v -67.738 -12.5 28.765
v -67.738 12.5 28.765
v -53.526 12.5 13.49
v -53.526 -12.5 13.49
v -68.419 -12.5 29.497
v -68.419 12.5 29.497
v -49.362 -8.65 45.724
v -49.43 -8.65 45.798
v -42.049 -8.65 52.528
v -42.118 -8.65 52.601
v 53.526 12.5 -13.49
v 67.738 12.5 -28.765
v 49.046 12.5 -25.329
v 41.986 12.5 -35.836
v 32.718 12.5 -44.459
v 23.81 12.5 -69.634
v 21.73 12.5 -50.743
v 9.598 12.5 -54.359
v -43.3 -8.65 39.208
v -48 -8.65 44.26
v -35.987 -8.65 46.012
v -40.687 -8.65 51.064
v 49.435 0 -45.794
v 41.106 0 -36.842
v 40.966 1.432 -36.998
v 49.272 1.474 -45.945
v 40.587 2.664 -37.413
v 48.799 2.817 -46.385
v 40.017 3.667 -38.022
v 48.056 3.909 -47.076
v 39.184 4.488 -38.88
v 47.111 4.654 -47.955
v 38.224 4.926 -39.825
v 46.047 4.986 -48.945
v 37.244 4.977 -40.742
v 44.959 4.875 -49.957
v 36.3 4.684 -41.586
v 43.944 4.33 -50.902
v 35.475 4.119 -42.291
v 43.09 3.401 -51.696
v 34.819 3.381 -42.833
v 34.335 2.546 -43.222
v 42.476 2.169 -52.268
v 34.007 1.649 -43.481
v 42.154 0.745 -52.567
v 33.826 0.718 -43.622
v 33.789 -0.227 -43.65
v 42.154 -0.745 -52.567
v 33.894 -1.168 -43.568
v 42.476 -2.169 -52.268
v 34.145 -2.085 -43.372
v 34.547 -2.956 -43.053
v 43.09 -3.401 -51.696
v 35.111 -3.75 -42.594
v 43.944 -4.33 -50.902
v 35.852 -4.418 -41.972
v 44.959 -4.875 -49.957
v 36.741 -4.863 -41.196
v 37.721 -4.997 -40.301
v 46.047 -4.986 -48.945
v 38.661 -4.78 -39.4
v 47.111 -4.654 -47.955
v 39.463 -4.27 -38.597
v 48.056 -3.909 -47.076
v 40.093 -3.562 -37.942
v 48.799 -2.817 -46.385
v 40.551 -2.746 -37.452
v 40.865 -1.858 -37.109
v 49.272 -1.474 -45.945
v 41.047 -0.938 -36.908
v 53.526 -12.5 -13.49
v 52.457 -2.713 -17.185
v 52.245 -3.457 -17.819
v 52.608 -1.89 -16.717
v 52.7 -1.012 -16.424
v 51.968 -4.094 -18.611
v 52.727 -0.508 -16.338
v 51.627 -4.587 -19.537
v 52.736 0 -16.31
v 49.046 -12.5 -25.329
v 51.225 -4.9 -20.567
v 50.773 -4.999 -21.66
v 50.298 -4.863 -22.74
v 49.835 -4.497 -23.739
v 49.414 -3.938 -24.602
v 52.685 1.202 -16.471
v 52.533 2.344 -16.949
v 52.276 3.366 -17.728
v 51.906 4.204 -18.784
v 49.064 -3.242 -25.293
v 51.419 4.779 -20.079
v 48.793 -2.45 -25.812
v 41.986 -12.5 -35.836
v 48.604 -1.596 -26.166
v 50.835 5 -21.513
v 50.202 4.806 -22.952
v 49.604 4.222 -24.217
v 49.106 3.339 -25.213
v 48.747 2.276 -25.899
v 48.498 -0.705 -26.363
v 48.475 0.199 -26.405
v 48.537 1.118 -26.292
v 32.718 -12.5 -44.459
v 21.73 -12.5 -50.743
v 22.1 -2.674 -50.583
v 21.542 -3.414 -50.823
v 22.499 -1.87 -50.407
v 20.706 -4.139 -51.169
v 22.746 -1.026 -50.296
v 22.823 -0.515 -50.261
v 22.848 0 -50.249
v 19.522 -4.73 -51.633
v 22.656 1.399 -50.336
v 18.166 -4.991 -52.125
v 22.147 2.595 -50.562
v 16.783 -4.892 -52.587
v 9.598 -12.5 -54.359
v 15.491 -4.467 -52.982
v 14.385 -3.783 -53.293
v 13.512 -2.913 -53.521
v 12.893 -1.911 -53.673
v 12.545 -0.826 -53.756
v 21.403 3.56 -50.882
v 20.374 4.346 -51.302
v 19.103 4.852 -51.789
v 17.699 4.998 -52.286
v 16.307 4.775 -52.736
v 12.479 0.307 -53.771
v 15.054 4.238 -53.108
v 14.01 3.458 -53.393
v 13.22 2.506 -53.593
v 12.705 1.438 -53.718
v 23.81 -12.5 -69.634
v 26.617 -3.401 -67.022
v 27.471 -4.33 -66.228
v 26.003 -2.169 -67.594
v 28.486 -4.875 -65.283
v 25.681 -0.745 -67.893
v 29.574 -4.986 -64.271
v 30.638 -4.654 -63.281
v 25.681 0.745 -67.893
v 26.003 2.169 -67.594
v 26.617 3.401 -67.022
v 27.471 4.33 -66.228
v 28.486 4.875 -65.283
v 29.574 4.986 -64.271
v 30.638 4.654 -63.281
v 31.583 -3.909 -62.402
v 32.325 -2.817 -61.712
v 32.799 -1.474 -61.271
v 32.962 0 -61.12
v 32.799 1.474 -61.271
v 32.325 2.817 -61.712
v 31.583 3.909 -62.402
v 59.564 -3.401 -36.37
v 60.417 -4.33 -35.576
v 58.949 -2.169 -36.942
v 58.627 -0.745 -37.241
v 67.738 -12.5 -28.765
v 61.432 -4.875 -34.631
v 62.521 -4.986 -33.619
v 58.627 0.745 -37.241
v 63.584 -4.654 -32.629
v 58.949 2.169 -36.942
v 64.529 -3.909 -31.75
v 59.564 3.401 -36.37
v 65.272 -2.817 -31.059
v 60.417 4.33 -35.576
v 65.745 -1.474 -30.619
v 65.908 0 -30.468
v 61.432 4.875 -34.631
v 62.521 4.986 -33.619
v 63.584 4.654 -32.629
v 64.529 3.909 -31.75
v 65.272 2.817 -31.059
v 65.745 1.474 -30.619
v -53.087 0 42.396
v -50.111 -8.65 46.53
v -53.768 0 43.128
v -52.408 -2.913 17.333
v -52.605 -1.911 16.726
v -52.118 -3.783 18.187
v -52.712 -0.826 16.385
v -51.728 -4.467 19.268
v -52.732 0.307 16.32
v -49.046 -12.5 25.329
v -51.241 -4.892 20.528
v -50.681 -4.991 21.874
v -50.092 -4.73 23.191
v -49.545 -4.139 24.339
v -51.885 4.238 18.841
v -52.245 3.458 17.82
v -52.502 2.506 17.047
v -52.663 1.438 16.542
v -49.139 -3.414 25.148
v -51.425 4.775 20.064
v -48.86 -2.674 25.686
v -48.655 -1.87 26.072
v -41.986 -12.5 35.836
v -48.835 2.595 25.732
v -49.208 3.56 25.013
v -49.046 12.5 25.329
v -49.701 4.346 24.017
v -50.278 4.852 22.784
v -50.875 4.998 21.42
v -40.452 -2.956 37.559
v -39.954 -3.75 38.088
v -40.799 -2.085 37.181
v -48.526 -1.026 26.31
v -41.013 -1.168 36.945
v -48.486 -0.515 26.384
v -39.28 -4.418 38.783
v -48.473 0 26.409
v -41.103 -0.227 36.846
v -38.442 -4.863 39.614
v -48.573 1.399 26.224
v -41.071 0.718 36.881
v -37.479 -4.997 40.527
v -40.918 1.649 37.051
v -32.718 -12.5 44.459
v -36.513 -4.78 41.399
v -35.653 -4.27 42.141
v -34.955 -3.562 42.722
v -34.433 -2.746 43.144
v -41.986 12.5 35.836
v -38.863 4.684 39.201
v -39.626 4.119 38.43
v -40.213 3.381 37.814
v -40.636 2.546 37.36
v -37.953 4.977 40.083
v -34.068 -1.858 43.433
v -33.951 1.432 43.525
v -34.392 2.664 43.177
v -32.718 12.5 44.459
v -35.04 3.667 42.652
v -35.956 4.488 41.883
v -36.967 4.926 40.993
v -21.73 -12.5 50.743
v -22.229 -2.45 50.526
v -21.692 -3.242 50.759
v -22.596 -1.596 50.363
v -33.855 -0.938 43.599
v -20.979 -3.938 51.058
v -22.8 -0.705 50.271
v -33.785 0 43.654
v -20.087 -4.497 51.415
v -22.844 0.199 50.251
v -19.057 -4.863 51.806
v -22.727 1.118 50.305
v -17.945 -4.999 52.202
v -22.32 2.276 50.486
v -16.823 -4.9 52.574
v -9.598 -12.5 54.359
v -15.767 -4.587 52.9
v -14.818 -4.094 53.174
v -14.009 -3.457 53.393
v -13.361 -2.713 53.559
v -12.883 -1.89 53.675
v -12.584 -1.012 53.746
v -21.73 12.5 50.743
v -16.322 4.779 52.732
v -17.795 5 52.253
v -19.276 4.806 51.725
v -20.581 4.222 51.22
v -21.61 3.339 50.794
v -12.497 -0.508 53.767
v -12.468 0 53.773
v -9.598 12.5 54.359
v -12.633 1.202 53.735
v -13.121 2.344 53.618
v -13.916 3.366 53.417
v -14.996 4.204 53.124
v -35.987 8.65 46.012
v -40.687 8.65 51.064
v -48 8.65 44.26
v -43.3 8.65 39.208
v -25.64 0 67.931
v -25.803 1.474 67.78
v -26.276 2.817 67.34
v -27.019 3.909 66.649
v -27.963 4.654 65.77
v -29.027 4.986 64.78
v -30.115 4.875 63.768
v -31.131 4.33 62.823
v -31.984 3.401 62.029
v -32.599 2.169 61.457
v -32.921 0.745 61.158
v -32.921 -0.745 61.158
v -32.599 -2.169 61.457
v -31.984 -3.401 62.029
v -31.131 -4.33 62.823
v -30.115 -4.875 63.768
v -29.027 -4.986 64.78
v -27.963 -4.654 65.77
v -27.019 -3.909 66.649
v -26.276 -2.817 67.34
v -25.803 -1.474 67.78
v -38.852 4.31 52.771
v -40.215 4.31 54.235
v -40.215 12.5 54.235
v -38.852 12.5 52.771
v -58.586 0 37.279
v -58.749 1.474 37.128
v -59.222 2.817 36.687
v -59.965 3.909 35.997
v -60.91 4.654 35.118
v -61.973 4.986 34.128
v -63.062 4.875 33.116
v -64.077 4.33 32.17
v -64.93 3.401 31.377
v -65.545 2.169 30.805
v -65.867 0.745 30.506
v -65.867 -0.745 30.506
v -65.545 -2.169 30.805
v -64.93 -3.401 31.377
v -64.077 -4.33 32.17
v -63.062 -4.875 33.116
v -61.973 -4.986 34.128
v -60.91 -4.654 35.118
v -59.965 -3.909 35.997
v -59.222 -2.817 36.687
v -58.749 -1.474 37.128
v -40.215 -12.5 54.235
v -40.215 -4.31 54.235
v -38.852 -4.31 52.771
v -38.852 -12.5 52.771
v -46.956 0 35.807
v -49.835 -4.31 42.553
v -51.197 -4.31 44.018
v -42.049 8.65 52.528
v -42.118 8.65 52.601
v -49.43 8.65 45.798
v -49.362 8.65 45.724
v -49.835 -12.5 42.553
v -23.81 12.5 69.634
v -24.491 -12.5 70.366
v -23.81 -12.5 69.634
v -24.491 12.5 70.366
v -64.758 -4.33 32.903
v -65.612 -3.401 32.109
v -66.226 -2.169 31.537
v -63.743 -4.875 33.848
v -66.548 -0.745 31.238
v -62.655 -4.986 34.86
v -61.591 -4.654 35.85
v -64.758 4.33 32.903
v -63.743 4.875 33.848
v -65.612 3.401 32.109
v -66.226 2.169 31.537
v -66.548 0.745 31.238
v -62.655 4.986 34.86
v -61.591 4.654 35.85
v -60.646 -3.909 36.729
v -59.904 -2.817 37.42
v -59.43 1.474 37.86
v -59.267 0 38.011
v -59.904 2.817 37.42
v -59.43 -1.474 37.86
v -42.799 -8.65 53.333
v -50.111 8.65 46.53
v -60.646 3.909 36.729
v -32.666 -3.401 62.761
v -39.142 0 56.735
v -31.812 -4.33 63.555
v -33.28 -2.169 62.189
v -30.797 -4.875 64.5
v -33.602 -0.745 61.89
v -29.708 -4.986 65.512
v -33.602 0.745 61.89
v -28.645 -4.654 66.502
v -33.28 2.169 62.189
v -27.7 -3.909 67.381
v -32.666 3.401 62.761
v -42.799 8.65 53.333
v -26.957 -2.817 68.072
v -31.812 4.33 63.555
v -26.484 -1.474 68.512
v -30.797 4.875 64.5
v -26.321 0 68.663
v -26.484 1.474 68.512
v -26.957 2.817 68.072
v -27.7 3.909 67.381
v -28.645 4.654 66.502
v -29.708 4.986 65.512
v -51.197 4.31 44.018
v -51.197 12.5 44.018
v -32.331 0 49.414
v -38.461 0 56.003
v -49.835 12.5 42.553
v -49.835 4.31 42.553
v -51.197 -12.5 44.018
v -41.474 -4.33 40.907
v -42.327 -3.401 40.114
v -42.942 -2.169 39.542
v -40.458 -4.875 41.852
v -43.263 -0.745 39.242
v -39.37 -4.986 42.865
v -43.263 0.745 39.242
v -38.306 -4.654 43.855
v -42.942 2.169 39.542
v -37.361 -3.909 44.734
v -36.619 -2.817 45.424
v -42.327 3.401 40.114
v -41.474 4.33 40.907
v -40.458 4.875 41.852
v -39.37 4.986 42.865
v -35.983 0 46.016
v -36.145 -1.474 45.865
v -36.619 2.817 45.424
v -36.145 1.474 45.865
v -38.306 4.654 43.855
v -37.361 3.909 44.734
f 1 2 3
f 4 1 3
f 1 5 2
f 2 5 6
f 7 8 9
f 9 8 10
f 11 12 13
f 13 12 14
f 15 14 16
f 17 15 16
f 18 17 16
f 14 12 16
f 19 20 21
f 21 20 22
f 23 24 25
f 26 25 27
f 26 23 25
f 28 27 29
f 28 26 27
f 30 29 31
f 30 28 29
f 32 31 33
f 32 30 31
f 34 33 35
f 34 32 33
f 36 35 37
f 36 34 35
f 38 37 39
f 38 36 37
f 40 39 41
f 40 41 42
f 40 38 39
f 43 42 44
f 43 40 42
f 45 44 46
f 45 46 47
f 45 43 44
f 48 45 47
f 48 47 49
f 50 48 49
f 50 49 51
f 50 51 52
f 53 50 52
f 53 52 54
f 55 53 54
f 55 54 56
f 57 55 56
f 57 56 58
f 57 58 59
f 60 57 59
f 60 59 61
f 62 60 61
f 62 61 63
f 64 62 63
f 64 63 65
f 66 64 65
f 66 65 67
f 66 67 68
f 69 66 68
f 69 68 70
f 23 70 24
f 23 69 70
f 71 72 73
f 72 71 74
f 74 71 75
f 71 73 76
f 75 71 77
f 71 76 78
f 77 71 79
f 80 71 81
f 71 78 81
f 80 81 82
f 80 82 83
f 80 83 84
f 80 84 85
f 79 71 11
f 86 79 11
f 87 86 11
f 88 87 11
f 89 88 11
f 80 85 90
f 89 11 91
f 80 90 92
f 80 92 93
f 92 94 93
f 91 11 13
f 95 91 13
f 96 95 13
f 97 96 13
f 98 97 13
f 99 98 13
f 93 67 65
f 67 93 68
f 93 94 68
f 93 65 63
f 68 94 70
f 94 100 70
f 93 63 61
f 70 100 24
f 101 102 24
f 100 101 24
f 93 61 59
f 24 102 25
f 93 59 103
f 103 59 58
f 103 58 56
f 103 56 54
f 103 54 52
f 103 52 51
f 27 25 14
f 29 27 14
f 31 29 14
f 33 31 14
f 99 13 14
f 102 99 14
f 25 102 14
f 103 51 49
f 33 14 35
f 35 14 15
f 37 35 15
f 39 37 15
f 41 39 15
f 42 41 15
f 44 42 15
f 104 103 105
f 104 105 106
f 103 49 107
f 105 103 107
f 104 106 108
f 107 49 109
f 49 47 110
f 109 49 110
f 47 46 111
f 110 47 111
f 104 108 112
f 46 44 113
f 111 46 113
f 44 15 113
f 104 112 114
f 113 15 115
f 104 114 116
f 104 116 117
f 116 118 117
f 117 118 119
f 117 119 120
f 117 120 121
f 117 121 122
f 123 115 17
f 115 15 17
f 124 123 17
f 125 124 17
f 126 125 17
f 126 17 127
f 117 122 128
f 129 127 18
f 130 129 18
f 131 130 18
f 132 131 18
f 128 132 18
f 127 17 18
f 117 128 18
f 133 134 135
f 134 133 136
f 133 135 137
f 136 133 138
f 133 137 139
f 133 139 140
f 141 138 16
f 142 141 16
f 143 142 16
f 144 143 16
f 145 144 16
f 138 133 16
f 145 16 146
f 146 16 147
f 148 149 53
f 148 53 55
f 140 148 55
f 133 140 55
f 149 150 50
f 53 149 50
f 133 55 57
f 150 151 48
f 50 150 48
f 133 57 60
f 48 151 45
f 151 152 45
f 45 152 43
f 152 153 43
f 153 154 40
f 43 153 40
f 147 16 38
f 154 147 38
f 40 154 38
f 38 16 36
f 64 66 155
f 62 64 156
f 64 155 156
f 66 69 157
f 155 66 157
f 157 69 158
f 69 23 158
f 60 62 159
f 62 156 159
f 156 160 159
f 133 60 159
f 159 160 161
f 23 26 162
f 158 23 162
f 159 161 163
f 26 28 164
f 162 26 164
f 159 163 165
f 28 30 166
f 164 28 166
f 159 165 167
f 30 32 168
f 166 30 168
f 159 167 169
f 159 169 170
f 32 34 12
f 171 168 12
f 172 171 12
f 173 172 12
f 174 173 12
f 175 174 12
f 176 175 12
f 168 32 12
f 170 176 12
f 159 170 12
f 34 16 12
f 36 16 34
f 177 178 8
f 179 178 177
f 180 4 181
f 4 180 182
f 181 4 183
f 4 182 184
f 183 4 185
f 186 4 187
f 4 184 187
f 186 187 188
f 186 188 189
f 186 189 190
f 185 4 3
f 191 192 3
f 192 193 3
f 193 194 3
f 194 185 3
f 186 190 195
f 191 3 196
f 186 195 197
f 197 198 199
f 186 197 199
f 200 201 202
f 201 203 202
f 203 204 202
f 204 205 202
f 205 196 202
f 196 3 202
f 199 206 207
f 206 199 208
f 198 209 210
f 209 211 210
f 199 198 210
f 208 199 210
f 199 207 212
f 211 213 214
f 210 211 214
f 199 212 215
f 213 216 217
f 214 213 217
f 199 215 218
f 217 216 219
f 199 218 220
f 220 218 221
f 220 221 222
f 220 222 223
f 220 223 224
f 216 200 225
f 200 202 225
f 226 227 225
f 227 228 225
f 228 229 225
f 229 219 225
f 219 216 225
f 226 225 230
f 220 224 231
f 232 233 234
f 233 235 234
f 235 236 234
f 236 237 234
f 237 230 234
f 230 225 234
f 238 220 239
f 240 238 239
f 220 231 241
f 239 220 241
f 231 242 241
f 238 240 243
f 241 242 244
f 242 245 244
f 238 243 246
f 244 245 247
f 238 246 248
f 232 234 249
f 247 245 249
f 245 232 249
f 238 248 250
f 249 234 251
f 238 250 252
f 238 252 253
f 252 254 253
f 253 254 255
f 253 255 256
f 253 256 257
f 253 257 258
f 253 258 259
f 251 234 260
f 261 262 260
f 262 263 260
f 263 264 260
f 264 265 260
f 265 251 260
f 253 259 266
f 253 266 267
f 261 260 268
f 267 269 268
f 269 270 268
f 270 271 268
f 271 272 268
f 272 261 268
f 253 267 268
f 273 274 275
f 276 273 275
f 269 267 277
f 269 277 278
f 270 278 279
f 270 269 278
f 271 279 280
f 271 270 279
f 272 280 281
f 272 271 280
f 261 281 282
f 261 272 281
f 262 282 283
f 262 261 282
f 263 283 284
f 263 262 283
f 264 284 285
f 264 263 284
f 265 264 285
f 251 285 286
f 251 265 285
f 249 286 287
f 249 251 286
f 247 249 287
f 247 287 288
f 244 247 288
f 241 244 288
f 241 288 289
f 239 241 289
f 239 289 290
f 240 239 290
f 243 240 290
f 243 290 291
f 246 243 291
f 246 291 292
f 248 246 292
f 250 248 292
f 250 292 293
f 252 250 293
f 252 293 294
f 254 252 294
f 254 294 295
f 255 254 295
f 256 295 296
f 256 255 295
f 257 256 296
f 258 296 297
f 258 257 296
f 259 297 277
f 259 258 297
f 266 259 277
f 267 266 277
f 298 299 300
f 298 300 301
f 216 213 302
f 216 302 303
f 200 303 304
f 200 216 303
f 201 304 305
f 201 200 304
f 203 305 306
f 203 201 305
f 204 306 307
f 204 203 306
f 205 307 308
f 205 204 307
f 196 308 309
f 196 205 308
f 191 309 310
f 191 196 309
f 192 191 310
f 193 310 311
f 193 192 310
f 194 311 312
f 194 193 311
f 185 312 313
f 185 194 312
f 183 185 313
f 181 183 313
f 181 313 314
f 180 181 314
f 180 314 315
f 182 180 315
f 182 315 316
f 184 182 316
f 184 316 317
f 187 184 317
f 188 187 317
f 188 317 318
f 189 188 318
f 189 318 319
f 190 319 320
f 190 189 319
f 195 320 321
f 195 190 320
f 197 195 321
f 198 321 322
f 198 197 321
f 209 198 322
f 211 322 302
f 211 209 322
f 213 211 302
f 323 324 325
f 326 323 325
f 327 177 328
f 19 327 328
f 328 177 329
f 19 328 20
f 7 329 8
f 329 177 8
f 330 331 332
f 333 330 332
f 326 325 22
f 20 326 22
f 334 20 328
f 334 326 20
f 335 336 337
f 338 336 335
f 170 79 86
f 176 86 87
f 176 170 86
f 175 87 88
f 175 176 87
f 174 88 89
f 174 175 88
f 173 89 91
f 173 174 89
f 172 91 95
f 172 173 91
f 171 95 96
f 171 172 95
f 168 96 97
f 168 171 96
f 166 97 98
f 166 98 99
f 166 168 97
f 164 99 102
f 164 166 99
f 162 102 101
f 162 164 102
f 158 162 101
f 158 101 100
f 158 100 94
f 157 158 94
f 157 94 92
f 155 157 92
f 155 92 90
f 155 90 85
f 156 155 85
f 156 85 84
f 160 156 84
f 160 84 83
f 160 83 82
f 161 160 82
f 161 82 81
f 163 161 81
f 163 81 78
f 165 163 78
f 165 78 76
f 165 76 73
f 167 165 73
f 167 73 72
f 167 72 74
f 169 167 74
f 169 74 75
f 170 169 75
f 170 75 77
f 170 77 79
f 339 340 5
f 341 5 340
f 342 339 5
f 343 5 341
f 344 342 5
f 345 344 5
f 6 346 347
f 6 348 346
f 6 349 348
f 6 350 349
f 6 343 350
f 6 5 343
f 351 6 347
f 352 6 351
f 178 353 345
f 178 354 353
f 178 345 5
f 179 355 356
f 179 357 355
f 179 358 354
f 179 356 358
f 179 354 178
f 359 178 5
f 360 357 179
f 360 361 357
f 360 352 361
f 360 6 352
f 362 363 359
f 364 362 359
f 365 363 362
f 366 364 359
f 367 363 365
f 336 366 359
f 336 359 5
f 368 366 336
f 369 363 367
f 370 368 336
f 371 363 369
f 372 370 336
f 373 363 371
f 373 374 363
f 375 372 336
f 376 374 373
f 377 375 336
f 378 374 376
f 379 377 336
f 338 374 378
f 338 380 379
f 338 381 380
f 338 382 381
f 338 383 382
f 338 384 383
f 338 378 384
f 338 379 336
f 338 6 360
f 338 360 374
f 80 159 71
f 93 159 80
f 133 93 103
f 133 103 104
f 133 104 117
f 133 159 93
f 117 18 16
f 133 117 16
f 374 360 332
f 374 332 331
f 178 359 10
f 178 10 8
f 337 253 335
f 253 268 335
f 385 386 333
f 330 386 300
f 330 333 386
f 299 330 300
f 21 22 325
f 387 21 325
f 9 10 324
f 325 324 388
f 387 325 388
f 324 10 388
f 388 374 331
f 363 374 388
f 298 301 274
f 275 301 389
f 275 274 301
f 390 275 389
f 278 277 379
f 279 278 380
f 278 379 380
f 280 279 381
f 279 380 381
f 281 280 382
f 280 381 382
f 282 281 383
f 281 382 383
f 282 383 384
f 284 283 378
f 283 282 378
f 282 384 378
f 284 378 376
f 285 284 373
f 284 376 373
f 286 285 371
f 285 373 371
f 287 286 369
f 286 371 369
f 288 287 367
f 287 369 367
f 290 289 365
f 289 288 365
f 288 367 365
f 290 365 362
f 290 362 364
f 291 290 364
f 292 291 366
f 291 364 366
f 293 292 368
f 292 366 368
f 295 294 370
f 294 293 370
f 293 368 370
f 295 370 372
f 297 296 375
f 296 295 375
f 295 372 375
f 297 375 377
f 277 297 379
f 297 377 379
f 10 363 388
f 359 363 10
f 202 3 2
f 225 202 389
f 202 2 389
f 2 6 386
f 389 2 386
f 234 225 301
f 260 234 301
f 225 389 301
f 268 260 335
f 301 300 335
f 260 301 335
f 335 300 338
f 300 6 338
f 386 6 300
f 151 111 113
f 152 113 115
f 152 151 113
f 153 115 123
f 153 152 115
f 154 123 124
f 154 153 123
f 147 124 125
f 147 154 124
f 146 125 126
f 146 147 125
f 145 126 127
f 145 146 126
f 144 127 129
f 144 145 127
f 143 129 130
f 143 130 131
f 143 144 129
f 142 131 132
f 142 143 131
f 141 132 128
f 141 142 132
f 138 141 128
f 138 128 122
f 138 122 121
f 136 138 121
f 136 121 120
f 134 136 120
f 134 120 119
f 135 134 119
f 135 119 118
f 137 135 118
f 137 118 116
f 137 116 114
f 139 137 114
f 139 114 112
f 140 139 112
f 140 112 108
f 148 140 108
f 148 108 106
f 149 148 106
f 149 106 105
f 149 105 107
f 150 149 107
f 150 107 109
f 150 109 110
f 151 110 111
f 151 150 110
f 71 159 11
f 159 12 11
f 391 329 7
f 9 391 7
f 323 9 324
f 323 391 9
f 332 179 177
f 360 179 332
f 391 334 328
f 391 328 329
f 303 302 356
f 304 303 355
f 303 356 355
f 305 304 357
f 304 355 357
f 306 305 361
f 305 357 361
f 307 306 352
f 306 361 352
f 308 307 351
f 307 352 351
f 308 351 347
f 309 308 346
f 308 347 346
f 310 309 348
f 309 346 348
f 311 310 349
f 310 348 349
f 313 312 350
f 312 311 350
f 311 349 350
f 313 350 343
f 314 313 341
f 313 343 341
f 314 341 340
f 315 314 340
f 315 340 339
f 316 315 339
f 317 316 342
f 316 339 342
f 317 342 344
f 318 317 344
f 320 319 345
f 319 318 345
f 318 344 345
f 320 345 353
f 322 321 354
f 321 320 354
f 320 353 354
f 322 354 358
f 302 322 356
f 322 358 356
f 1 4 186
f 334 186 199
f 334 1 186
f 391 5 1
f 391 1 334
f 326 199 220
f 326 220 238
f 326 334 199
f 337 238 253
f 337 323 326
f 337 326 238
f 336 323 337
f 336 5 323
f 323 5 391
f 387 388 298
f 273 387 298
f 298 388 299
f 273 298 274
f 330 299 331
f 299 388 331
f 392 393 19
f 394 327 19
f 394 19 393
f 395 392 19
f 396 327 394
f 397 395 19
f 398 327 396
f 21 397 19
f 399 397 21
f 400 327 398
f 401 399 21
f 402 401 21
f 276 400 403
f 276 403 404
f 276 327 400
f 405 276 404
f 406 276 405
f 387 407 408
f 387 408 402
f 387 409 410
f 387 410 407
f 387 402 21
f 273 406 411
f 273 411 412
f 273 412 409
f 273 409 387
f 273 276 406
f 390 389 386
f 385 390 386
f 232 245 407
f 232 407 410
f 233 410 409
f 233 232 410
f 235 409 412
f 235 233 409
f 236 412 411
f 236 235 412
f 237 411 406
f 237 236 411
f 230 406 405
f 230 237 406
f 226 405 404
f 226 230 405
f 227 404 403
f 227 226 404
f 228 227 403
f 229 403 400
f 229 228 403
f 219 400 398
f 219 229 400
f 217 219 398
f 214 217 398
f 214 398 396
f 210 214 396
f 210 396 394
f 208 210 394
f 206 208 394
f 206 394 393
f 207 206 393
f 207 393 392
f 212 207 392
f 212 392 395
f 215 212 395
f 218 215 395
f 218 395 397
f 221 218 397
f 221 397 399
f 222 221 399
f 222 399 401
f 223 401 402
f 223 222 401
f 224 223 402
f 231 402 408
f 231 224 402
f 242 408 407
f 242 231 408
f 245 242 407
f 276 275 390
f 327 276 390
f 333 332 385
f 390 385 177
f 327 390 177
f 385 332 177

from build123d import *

# Parameters (mm, degrees)
BOSS_EXTRUDE1_DEPTH     = 12.5
BOSS_EXTRUDE1_2_DEPTH   = 12.5
CUT_EXTRUDE1_DEPTH      = 165.810970211
CUT_EXTRUDE1_DEPTH_BACK = 165.810970211
SKETCH3_R               = 5
CUT_EXTRUDE2_DEPTH      = 9
CUT_EXTRUDE3_DEPTH      = 101.311330148
CUT_EXTRUDE3_DEPTH_BACK = 101.311330148
BOSS_EXTRUDE2_START     = 1
SKETCH6_W               = 60
SKETCH6_H               = 25
SKETCH6_R               = 5
BOSS_EXTRUDE2_DEPTH     = 1


with BuildPart() as part:
    # Sketch2 → Boss-Extrude1 (new, symmetric)
    with BuildSketch(Plane(origin=(0, 0, 0), x_dir=(1, 0, 0), z_dir=(0, 1, 0))):
        with BuildLine():
            Line((23.809882535, 69.634255174), (67.737976478, 28.764675258))
            Line((67.737976478, 28.764675258), (53.526372239, 13.48953205))
            ThreePointArc((53.526372239, 13.48953205), (37.600013523, 40.413846427), (9.598278296, 54.359111966))
            Line((9.598278296, 54.359111966), (23.809882535, 69.634255174))
        make_face()
    extrude(amount=BOSS_EXTRUDE1_DEPTH, both=True)


with BuildPart() as body_2:
    # Sketch2 → Boss-Extrude1 2 (new, symmetric)
    with BuildSketch(Plane(origin=(0, 0, 0), x_dir=(1, 0, 0), z_dir=(0, 1, 0))):
        with BuildLine():
            Line((-67.737976478, -28.764675258), (-53.526372239, -13.48953205))
            ThreePointArc((-53.526372239, -13.48953205), (-37.600013523, -40.413846427), (-9.598278296, -54.359111966))
            Line((-9.598278296, -54.359111966), (-23.809882535, -69.634255174))
            Line((-23.809882535, -69.634255174), (-67.737976478, -28.764675258))
        make_face()
    extrude(amount=BOSS_EXTRUDE1_2_DEPTH, both=True)


with BuildPart() as cut_extrude1_tool:
    # Sketch3 → Cut-Extrude1 (new, two sides: drawn at the far end of the back side and taken through both)
    with BuildSketch(Plane(origin=(-45.773929507, 0, 49.199465216), x_dir=(0.7321348990455281, 0, 0.6811596652765007), z_dir=(-0.6811596652765007, 0, 0.7321348990455281)).offset(-CUT_EXTRUDE1_DEPTH_BACK)):
        with Locations((-22.5, 0)):
            Circle(SKETCH3_R)
        Circle(SKETCH3_R)
        with Locations((22.5, 0)):
            Circle(SKETCH3_R)
    extrude(amount=CUT_EXTRUDE1_DEPTH + CUT_EXTRUDE1_DEPTH_BACK)


with BuildPart() as part_1:
    add(part.part)

    # Cut-Extrude1: cut by cut_extrude1_tool
    add(cut_extrude1_tool.part, mode=Mode.SUBTRACT)


with BuildPart() as body_2_1:
    add(body_2.part)

    # Cut-Extrude1: cut by cut_extrude1_tool
    add(cut_extrude1_tool.part, mode=Mode.SUBTRACT)

    # Sketch4 → Cut-Extrude2 (cut)
    with BuildSketch(Plane(origin=(-45.773929507, 0, 49.199465216), x_dir=(0.7321348990455281, 0, 0.6811596652765007), z_dir=(-0.6811596652765007, 0, 0.7321348990455281))):
        Polygon((4.994079828, 8.65), (-4.994079828, 8.65), (-9.988159657, 0), (-4.994079828, -8.65), (4.994079828, -8.65), (9.988159657, 0), align=None)
    extrude(amount=-CUT_EXTRUDE2_DEPTH, mode=Mode.SUBTRACT)

    # Sketch5 → Cut-Extrude3 (cut, two sides: drawn at the far end of the back side and taken through both)
    with BuildSketch(Plane(origin=(0, 12.5, 0), x_dir=(1, 0, 0), z_dir=(0, 1, 0)).offset(-CUT_EXTRUDE3_DEPTH_BACK)):
        Polygon((-51.196825283, -44.017554236), (-40.214801797, -54.234949216), (-38.852482467, -52.770679417), (-49.834505952, -42.553284438), align=None)
    extrude(amount=CUT_EXTRUDE3_DEPTH + CUT_EXTRUDE3_DEPTH_BACK, mode=Mode.SUBTRACT)

    # Sketch6 → Boss-Extrude2 (add)
    with BuildSketch(Plane(origin=(-45.773929507, 0, 49.199465216), x_dir=(0.7321348990455281, 0, 0.6811596652765007), z_dir=(-0.6811596652765007, 0, 0.7321348990455281)).offset(BOSS_EXTRUDE2_START)):
        Rectangle(SKETCH6_W, SKETCH6_H)
        with Locations((-22.5, 0)):
            Circle(SKETCH6_R, mode=Mode.SUBTRACT)
        Polygon((-4.994079828, -8.65), (-9.988159657, 0), (-4.994079828, 8.65), (4.994079828, 8.65), (9.988159657, 0), (4.994079828, -8.65), align=None, mode=Mode.SUBTRACT)
        with Locations((22.5, 0)):
            Circle(SKETCH6_R, mode=Mode.SUBTRACT)
    extrude(amount=-BOSS_EXTRUDE2_DEPTH)


solid = Compound([part_1.part, body_2_1.part])
